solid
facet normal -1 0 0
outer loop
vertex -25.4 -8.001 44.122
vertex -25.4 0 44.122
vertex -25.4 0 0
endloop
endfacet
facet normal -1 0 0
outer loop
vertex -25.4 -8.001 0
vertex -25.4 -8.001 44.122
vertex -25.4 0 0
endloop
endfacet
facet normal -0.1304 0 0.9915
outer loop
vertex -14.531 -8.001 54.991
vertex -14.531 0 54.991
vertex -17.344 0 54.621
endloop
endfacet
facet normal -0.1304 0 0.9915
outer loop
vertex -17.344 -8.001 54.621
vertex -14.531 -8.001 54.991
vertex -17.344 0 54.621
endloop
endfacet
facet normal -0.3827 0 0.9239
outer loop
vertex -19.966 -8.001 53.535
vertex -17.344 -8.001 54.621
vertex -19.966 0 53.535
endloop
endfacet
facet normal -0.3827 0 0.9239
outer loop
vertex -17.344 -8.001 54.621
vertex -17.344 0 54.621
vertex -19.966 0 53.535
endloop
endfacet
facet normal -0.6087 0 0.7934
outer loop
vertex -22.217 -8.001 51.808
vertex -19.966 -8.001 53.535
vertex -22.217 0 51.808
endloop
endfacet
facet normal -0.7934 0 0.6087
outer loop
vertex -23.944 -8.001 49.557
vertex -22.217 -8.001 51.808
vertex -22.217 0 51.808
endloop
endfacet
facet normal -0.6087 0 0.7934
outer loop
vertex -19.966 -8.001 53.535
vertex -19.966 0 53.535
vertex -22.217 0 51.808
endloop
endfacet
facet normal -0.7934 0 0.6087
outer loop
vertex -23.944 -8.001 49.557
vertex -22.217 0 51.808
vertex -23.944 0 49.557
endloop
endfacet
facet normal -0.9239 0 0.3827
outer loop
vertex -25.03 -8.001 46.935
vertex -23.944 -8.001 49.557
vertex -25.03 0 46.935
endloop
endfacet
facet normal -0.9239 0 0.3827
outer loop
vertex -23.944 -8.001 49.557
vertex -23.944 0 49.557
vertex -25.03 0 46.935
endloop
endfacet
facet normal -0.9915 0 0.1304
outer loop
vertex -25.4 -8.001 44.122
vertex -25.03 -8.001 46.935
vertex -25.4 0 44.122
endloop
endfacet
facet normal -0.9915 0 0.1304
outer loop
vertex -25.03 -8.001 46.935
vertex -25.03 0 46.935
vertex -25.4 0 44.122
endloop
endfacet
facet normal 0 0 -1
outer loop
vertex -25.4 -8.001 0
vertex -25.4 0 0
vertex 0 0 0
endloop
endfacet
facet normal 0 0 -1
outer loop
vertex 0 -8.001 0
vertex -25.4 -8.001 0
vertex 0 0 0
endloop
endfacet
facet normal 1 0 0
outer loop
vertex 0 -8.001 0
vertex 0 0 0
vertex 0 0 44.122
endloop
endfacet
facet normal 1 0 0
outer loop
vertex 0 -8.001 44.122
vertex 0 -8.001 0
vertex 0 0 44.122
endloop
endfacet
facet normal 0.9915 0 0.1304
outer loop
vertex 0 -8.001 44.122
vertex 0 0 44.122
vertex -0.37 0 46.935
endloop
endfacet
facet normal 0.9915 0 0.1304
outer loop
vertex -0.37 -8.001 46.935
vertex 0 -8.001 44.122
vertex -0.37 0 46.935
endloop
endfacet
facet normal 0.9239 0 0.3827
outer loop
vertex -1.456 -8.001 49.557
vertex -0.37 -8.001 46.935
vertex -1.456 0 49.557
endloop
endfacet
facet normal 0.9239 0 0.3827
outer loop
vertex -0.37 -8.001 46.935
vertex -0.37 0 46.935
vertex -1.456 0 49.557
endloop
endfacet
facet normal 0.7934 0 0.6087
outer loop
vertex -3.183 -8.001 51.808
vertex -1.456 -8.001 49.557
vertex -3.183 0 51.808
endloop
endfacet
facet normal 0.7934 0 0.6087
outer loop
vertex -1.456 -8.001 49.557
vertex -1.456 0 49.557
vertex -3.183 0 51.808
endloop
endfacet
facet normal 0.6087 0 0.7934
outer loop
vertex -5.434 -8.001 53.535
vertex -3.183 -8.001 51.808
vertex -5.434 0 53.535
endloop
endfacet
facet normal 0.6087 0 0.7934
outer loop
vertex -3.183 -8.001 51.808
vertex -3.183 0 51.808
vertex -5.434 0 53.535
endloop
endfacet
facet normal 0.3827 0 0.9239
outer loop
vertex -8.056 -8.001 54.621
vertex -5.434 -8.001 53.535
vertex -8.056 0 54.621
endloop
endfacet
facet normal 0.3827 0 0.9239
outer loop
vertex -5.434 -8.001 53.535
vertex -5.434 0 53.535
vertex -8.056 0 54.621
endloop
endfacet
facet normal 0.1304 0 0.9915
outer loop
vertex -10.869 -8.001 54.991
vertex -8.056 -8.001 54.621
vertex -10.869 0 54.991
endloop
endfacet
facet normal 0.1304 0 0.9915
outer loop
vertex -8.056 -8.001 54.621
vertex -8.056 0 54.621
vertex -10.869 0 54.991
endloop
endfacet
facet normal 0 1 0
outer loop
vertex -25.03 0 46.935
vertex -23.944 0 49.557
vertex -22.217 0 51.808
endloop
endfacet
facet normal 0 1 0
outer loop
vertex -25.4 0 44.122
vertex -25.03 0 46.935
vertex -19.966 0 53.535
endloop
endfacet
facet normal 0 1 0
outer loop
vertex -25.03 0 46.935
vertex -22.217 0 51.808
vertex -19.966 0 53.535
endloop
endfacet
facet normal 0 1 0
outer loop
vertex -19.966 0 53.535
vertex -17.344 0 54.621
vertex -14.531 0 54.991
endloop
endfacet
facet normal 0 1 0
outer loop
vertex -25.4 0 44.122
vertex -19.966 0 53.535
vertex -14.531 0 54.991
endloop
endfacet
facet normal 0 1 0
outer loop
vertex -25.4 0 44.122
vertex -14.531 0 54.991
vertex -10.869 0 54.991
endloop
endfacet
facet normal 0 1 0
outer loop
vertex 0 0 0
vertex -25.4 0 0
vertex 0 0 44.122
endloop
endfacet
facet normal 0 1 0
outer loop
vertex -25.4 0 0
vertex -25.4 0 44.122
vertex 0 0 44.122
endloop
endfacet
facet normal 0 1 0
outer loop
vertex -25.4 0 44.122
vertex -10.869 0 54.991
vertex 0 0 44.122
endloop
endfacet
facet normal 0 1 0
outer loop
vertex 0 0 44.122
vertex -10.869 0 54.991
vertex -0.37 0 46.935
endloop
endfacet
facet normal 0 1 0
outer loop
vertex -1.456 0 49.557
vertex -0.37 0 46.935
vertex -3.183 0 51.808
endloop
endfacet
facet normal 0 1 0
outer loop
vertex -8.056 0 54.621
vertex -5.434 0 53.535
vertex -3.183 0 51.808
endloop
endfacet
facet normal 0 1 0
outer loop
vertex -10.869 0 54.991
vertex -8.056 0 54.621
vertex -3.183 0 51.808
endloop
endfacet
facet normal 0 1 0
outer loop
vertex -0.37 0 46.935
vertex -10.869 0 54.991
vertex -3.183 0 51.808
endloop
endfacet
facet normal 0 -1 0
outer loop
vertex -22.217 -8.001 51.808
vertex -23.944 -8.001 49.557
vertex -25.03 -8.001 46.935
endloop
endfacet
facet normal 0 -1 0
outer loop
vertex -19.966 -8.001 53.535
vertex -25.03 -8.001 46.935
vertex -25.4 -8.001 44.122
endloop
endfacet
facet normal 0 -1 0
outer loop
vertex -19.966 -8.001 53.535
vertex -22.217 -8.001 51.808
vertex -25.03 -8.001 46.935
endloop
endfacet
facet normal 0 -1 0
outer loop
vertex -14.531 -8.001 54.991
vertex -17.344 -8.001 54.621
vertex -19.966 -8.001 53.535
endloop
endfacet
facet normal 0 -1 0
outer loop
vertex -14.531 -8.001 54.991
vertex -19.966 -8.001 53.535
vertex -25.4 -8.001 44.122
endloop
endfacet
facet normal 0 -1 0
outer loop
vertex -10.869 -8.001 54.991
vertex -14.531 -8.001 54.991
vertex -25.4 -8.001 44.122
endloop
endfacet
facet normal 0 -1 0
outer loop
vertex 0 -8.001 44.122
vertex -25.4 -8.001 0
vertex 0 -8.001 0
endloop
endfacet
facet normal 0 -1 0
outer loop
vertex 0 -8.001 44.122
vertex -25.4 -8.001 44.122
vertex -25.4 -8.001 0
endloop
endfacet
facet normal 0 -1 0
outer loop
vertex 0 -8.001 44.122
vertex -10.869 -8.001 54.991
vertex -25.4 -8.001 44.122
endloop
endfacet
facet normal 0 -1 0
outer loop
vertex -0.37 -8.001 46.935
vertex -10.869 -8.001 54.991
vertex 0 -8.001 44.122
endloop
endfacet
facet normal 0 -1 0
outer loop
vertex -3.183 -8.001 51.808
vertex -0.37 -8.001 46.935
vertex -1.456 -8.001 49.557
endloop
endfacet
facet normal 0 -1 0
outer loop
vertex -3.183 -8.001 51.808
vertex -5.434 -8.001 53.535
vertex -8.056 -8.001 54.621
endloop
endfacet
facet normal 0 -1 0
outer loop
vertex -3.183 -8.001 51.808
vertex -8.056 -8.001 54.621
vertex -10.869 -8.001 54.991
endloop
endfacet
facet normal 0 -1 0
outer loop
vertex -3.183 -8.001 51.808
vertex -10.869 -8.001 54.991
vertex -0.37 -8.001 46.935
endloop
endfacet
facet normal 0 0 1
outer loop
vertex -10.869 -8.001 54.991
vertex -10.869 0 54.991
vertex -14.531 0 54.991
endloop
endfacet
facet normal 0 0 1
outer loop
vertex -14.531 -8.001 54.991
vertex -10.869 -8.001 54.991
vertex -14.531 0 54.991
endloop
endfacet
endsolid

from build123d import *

# Parameters (mm, degrees)
F1_DEPTH = 8.001


with BuildPart() as f1:
    # F0 (on Front) → F1 (new body)
    with BuildSketch(Plane.XZ):
        with BuildLine():
            Line((-25.4, 0), (0, 0))
            Line((0, 0), (0, 44.122111))
            ThreePointArc((0, 44.122111), (-3.183424, 51.807576), (-10.868889, 54.991))
            Line((-10.868889, 54.991), (-14.531116, 54.991))
            ThreePointArc((-14.531116, 54.991), (-22.216577, 51.807577), (-25.4, 44.122116))
            Line((-25.4, 44.122116), (-25.4, 0))
        make_face()
    extrude(amount=F1_DEPTH)


solid = f1.part
